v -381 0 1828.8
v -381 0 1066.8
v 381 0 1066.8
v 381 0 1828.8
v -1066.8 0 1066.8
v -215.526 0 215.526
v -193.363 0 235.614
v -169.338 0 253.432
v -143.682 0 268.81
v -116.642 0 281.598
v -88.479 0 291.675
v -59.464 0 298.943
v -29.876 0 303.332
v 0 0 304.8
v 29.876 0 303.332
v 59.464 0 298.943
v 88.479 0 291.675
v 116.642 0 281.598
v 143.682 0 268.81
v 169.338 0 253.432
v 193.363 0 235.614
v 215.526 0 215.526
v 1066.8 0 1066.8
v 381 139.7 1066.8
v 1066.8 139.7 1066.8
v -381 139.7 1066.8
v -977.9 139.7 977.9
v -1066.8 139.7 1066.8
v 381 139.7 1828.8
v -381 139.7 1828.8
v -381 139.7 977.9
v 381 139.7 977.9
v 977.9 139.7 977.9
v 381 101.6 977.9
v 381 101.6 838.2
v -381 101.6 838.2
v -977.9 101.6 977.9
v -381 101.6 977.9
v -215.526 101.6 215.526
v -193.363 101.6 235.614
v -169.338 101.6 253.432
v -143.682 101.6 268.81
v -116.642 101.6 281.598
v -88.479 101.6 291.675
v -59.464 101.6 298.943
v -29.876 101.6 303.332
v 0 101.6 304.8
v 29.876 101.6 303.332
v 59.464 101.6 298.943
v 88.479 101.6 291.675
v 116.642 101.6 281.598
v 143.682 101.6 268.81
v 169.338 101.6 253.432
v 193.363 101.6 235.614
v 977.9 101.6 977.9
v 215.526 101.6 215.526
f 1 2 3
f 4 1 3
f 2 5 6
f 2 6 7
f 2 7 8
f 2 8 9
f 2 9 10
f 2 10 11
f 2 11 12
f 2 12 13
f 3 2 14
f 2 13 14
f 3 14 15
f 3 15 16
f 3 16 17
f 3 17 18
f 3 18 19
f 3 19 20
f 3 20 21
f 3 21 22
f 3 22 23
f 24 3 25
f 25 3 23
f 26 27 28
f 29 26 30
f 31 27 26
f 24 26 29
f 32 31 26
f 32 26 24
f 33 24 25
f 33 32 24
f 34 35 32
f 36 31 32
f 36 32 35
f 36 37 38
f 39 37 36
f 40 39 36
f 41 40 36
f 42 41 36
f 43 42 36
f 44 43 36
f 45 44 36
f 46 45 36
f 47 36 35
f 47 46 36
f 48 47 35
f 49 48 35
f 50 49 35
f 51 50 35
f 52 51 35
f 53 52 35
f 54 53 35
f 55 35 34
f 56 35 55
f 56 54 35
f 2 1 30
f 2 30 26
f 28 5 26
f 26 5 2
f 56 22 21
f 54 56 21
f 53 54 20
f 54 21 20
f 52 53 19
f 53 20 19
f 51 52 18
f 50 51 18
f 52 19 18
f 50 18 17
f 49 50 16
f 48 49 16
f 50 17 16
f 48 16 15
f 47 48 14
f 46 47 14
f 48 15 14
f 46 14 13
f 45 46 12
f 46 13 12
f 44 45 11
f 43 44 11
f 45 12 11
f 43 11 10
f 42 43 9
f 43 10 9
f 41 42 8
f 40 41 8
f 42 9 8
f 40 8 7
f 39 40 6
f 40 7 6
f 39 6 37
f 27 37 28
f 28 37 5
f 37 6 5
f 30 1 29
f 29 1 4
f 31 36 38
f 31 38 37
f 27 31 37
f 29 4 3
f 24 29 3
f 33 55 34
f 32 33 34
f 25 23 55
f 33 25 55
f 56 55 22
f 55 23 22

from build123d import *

# Parameters (mm, degrees)
BOSS_EXTRUDE1_DEPTH      = 139.7
BOSS_EXTRUDE2_DEPTH      = 101.6
BOSS_EXTRUDE4_DEPTH      = 381
BOSS_EXTRUDE4_DEPTH_BACK = 381


with BuildPart() as part:
    # Sketch1 → Boss-Extrude1 (new body)
    with BuildSketch(Plane(origin=(0, 0, 0), x_dir=(1, 0, 0), z_dir=(0, 1, 0))):
        Polygon((-977.9, -977.9), (-1066.8, -1066.8), (-381, -1066.8), (-381, -1828.8), (381, -1828.8), (381, -1066.8), (1066.8, -1066.8), (977.9, -977.9), align=None)
    extrude(amount=BOSS_EXTRUDE1_DEPTH)

    # Sketch1<10> → Boss-Extrude2 (add)
    with BuildSketch(Plane(origin=(0, 0, 0), x_dir=(1, 0, 0), z_dir=(0, 1, 0))):
        with BuildLine():
            Line((-977.9, -977.9), (977.9, -977.9))
            Line((977.9, -977.9), (215.526146906, -215.526146906))
            ThreePointArc((215.526146906, -215.526146906), (0, -304.8), (-215.526146906, -215.526146906))
            Line((-215.526146906, -215.526146906), (-977.9, -977.9))
        make_face()
    extrude(amount=BOSS_EXTRUDE2_DEPTH)

    # Sketch10 → Boss-Extrude4 (add, two sides: drawn at the far end of the back side and taken through both)
    with BuildSketch(Plane(origin=(0, 0, 0), x_dir=(0, 0, -1), z_dir=(1, 0, 0)).offset(-BOSS_EXTRUDE4_DEPTH_BACK)):
        Polygon((-977.9, 101.6), (-977.9, 139.7), (-838.2, 101.6), align=None)
    extrude(amount=BOSS_EXTRUDE4_DEPTH + BOSS_EXTRUDE4_DEPTH_BACK)


solid = part.part
